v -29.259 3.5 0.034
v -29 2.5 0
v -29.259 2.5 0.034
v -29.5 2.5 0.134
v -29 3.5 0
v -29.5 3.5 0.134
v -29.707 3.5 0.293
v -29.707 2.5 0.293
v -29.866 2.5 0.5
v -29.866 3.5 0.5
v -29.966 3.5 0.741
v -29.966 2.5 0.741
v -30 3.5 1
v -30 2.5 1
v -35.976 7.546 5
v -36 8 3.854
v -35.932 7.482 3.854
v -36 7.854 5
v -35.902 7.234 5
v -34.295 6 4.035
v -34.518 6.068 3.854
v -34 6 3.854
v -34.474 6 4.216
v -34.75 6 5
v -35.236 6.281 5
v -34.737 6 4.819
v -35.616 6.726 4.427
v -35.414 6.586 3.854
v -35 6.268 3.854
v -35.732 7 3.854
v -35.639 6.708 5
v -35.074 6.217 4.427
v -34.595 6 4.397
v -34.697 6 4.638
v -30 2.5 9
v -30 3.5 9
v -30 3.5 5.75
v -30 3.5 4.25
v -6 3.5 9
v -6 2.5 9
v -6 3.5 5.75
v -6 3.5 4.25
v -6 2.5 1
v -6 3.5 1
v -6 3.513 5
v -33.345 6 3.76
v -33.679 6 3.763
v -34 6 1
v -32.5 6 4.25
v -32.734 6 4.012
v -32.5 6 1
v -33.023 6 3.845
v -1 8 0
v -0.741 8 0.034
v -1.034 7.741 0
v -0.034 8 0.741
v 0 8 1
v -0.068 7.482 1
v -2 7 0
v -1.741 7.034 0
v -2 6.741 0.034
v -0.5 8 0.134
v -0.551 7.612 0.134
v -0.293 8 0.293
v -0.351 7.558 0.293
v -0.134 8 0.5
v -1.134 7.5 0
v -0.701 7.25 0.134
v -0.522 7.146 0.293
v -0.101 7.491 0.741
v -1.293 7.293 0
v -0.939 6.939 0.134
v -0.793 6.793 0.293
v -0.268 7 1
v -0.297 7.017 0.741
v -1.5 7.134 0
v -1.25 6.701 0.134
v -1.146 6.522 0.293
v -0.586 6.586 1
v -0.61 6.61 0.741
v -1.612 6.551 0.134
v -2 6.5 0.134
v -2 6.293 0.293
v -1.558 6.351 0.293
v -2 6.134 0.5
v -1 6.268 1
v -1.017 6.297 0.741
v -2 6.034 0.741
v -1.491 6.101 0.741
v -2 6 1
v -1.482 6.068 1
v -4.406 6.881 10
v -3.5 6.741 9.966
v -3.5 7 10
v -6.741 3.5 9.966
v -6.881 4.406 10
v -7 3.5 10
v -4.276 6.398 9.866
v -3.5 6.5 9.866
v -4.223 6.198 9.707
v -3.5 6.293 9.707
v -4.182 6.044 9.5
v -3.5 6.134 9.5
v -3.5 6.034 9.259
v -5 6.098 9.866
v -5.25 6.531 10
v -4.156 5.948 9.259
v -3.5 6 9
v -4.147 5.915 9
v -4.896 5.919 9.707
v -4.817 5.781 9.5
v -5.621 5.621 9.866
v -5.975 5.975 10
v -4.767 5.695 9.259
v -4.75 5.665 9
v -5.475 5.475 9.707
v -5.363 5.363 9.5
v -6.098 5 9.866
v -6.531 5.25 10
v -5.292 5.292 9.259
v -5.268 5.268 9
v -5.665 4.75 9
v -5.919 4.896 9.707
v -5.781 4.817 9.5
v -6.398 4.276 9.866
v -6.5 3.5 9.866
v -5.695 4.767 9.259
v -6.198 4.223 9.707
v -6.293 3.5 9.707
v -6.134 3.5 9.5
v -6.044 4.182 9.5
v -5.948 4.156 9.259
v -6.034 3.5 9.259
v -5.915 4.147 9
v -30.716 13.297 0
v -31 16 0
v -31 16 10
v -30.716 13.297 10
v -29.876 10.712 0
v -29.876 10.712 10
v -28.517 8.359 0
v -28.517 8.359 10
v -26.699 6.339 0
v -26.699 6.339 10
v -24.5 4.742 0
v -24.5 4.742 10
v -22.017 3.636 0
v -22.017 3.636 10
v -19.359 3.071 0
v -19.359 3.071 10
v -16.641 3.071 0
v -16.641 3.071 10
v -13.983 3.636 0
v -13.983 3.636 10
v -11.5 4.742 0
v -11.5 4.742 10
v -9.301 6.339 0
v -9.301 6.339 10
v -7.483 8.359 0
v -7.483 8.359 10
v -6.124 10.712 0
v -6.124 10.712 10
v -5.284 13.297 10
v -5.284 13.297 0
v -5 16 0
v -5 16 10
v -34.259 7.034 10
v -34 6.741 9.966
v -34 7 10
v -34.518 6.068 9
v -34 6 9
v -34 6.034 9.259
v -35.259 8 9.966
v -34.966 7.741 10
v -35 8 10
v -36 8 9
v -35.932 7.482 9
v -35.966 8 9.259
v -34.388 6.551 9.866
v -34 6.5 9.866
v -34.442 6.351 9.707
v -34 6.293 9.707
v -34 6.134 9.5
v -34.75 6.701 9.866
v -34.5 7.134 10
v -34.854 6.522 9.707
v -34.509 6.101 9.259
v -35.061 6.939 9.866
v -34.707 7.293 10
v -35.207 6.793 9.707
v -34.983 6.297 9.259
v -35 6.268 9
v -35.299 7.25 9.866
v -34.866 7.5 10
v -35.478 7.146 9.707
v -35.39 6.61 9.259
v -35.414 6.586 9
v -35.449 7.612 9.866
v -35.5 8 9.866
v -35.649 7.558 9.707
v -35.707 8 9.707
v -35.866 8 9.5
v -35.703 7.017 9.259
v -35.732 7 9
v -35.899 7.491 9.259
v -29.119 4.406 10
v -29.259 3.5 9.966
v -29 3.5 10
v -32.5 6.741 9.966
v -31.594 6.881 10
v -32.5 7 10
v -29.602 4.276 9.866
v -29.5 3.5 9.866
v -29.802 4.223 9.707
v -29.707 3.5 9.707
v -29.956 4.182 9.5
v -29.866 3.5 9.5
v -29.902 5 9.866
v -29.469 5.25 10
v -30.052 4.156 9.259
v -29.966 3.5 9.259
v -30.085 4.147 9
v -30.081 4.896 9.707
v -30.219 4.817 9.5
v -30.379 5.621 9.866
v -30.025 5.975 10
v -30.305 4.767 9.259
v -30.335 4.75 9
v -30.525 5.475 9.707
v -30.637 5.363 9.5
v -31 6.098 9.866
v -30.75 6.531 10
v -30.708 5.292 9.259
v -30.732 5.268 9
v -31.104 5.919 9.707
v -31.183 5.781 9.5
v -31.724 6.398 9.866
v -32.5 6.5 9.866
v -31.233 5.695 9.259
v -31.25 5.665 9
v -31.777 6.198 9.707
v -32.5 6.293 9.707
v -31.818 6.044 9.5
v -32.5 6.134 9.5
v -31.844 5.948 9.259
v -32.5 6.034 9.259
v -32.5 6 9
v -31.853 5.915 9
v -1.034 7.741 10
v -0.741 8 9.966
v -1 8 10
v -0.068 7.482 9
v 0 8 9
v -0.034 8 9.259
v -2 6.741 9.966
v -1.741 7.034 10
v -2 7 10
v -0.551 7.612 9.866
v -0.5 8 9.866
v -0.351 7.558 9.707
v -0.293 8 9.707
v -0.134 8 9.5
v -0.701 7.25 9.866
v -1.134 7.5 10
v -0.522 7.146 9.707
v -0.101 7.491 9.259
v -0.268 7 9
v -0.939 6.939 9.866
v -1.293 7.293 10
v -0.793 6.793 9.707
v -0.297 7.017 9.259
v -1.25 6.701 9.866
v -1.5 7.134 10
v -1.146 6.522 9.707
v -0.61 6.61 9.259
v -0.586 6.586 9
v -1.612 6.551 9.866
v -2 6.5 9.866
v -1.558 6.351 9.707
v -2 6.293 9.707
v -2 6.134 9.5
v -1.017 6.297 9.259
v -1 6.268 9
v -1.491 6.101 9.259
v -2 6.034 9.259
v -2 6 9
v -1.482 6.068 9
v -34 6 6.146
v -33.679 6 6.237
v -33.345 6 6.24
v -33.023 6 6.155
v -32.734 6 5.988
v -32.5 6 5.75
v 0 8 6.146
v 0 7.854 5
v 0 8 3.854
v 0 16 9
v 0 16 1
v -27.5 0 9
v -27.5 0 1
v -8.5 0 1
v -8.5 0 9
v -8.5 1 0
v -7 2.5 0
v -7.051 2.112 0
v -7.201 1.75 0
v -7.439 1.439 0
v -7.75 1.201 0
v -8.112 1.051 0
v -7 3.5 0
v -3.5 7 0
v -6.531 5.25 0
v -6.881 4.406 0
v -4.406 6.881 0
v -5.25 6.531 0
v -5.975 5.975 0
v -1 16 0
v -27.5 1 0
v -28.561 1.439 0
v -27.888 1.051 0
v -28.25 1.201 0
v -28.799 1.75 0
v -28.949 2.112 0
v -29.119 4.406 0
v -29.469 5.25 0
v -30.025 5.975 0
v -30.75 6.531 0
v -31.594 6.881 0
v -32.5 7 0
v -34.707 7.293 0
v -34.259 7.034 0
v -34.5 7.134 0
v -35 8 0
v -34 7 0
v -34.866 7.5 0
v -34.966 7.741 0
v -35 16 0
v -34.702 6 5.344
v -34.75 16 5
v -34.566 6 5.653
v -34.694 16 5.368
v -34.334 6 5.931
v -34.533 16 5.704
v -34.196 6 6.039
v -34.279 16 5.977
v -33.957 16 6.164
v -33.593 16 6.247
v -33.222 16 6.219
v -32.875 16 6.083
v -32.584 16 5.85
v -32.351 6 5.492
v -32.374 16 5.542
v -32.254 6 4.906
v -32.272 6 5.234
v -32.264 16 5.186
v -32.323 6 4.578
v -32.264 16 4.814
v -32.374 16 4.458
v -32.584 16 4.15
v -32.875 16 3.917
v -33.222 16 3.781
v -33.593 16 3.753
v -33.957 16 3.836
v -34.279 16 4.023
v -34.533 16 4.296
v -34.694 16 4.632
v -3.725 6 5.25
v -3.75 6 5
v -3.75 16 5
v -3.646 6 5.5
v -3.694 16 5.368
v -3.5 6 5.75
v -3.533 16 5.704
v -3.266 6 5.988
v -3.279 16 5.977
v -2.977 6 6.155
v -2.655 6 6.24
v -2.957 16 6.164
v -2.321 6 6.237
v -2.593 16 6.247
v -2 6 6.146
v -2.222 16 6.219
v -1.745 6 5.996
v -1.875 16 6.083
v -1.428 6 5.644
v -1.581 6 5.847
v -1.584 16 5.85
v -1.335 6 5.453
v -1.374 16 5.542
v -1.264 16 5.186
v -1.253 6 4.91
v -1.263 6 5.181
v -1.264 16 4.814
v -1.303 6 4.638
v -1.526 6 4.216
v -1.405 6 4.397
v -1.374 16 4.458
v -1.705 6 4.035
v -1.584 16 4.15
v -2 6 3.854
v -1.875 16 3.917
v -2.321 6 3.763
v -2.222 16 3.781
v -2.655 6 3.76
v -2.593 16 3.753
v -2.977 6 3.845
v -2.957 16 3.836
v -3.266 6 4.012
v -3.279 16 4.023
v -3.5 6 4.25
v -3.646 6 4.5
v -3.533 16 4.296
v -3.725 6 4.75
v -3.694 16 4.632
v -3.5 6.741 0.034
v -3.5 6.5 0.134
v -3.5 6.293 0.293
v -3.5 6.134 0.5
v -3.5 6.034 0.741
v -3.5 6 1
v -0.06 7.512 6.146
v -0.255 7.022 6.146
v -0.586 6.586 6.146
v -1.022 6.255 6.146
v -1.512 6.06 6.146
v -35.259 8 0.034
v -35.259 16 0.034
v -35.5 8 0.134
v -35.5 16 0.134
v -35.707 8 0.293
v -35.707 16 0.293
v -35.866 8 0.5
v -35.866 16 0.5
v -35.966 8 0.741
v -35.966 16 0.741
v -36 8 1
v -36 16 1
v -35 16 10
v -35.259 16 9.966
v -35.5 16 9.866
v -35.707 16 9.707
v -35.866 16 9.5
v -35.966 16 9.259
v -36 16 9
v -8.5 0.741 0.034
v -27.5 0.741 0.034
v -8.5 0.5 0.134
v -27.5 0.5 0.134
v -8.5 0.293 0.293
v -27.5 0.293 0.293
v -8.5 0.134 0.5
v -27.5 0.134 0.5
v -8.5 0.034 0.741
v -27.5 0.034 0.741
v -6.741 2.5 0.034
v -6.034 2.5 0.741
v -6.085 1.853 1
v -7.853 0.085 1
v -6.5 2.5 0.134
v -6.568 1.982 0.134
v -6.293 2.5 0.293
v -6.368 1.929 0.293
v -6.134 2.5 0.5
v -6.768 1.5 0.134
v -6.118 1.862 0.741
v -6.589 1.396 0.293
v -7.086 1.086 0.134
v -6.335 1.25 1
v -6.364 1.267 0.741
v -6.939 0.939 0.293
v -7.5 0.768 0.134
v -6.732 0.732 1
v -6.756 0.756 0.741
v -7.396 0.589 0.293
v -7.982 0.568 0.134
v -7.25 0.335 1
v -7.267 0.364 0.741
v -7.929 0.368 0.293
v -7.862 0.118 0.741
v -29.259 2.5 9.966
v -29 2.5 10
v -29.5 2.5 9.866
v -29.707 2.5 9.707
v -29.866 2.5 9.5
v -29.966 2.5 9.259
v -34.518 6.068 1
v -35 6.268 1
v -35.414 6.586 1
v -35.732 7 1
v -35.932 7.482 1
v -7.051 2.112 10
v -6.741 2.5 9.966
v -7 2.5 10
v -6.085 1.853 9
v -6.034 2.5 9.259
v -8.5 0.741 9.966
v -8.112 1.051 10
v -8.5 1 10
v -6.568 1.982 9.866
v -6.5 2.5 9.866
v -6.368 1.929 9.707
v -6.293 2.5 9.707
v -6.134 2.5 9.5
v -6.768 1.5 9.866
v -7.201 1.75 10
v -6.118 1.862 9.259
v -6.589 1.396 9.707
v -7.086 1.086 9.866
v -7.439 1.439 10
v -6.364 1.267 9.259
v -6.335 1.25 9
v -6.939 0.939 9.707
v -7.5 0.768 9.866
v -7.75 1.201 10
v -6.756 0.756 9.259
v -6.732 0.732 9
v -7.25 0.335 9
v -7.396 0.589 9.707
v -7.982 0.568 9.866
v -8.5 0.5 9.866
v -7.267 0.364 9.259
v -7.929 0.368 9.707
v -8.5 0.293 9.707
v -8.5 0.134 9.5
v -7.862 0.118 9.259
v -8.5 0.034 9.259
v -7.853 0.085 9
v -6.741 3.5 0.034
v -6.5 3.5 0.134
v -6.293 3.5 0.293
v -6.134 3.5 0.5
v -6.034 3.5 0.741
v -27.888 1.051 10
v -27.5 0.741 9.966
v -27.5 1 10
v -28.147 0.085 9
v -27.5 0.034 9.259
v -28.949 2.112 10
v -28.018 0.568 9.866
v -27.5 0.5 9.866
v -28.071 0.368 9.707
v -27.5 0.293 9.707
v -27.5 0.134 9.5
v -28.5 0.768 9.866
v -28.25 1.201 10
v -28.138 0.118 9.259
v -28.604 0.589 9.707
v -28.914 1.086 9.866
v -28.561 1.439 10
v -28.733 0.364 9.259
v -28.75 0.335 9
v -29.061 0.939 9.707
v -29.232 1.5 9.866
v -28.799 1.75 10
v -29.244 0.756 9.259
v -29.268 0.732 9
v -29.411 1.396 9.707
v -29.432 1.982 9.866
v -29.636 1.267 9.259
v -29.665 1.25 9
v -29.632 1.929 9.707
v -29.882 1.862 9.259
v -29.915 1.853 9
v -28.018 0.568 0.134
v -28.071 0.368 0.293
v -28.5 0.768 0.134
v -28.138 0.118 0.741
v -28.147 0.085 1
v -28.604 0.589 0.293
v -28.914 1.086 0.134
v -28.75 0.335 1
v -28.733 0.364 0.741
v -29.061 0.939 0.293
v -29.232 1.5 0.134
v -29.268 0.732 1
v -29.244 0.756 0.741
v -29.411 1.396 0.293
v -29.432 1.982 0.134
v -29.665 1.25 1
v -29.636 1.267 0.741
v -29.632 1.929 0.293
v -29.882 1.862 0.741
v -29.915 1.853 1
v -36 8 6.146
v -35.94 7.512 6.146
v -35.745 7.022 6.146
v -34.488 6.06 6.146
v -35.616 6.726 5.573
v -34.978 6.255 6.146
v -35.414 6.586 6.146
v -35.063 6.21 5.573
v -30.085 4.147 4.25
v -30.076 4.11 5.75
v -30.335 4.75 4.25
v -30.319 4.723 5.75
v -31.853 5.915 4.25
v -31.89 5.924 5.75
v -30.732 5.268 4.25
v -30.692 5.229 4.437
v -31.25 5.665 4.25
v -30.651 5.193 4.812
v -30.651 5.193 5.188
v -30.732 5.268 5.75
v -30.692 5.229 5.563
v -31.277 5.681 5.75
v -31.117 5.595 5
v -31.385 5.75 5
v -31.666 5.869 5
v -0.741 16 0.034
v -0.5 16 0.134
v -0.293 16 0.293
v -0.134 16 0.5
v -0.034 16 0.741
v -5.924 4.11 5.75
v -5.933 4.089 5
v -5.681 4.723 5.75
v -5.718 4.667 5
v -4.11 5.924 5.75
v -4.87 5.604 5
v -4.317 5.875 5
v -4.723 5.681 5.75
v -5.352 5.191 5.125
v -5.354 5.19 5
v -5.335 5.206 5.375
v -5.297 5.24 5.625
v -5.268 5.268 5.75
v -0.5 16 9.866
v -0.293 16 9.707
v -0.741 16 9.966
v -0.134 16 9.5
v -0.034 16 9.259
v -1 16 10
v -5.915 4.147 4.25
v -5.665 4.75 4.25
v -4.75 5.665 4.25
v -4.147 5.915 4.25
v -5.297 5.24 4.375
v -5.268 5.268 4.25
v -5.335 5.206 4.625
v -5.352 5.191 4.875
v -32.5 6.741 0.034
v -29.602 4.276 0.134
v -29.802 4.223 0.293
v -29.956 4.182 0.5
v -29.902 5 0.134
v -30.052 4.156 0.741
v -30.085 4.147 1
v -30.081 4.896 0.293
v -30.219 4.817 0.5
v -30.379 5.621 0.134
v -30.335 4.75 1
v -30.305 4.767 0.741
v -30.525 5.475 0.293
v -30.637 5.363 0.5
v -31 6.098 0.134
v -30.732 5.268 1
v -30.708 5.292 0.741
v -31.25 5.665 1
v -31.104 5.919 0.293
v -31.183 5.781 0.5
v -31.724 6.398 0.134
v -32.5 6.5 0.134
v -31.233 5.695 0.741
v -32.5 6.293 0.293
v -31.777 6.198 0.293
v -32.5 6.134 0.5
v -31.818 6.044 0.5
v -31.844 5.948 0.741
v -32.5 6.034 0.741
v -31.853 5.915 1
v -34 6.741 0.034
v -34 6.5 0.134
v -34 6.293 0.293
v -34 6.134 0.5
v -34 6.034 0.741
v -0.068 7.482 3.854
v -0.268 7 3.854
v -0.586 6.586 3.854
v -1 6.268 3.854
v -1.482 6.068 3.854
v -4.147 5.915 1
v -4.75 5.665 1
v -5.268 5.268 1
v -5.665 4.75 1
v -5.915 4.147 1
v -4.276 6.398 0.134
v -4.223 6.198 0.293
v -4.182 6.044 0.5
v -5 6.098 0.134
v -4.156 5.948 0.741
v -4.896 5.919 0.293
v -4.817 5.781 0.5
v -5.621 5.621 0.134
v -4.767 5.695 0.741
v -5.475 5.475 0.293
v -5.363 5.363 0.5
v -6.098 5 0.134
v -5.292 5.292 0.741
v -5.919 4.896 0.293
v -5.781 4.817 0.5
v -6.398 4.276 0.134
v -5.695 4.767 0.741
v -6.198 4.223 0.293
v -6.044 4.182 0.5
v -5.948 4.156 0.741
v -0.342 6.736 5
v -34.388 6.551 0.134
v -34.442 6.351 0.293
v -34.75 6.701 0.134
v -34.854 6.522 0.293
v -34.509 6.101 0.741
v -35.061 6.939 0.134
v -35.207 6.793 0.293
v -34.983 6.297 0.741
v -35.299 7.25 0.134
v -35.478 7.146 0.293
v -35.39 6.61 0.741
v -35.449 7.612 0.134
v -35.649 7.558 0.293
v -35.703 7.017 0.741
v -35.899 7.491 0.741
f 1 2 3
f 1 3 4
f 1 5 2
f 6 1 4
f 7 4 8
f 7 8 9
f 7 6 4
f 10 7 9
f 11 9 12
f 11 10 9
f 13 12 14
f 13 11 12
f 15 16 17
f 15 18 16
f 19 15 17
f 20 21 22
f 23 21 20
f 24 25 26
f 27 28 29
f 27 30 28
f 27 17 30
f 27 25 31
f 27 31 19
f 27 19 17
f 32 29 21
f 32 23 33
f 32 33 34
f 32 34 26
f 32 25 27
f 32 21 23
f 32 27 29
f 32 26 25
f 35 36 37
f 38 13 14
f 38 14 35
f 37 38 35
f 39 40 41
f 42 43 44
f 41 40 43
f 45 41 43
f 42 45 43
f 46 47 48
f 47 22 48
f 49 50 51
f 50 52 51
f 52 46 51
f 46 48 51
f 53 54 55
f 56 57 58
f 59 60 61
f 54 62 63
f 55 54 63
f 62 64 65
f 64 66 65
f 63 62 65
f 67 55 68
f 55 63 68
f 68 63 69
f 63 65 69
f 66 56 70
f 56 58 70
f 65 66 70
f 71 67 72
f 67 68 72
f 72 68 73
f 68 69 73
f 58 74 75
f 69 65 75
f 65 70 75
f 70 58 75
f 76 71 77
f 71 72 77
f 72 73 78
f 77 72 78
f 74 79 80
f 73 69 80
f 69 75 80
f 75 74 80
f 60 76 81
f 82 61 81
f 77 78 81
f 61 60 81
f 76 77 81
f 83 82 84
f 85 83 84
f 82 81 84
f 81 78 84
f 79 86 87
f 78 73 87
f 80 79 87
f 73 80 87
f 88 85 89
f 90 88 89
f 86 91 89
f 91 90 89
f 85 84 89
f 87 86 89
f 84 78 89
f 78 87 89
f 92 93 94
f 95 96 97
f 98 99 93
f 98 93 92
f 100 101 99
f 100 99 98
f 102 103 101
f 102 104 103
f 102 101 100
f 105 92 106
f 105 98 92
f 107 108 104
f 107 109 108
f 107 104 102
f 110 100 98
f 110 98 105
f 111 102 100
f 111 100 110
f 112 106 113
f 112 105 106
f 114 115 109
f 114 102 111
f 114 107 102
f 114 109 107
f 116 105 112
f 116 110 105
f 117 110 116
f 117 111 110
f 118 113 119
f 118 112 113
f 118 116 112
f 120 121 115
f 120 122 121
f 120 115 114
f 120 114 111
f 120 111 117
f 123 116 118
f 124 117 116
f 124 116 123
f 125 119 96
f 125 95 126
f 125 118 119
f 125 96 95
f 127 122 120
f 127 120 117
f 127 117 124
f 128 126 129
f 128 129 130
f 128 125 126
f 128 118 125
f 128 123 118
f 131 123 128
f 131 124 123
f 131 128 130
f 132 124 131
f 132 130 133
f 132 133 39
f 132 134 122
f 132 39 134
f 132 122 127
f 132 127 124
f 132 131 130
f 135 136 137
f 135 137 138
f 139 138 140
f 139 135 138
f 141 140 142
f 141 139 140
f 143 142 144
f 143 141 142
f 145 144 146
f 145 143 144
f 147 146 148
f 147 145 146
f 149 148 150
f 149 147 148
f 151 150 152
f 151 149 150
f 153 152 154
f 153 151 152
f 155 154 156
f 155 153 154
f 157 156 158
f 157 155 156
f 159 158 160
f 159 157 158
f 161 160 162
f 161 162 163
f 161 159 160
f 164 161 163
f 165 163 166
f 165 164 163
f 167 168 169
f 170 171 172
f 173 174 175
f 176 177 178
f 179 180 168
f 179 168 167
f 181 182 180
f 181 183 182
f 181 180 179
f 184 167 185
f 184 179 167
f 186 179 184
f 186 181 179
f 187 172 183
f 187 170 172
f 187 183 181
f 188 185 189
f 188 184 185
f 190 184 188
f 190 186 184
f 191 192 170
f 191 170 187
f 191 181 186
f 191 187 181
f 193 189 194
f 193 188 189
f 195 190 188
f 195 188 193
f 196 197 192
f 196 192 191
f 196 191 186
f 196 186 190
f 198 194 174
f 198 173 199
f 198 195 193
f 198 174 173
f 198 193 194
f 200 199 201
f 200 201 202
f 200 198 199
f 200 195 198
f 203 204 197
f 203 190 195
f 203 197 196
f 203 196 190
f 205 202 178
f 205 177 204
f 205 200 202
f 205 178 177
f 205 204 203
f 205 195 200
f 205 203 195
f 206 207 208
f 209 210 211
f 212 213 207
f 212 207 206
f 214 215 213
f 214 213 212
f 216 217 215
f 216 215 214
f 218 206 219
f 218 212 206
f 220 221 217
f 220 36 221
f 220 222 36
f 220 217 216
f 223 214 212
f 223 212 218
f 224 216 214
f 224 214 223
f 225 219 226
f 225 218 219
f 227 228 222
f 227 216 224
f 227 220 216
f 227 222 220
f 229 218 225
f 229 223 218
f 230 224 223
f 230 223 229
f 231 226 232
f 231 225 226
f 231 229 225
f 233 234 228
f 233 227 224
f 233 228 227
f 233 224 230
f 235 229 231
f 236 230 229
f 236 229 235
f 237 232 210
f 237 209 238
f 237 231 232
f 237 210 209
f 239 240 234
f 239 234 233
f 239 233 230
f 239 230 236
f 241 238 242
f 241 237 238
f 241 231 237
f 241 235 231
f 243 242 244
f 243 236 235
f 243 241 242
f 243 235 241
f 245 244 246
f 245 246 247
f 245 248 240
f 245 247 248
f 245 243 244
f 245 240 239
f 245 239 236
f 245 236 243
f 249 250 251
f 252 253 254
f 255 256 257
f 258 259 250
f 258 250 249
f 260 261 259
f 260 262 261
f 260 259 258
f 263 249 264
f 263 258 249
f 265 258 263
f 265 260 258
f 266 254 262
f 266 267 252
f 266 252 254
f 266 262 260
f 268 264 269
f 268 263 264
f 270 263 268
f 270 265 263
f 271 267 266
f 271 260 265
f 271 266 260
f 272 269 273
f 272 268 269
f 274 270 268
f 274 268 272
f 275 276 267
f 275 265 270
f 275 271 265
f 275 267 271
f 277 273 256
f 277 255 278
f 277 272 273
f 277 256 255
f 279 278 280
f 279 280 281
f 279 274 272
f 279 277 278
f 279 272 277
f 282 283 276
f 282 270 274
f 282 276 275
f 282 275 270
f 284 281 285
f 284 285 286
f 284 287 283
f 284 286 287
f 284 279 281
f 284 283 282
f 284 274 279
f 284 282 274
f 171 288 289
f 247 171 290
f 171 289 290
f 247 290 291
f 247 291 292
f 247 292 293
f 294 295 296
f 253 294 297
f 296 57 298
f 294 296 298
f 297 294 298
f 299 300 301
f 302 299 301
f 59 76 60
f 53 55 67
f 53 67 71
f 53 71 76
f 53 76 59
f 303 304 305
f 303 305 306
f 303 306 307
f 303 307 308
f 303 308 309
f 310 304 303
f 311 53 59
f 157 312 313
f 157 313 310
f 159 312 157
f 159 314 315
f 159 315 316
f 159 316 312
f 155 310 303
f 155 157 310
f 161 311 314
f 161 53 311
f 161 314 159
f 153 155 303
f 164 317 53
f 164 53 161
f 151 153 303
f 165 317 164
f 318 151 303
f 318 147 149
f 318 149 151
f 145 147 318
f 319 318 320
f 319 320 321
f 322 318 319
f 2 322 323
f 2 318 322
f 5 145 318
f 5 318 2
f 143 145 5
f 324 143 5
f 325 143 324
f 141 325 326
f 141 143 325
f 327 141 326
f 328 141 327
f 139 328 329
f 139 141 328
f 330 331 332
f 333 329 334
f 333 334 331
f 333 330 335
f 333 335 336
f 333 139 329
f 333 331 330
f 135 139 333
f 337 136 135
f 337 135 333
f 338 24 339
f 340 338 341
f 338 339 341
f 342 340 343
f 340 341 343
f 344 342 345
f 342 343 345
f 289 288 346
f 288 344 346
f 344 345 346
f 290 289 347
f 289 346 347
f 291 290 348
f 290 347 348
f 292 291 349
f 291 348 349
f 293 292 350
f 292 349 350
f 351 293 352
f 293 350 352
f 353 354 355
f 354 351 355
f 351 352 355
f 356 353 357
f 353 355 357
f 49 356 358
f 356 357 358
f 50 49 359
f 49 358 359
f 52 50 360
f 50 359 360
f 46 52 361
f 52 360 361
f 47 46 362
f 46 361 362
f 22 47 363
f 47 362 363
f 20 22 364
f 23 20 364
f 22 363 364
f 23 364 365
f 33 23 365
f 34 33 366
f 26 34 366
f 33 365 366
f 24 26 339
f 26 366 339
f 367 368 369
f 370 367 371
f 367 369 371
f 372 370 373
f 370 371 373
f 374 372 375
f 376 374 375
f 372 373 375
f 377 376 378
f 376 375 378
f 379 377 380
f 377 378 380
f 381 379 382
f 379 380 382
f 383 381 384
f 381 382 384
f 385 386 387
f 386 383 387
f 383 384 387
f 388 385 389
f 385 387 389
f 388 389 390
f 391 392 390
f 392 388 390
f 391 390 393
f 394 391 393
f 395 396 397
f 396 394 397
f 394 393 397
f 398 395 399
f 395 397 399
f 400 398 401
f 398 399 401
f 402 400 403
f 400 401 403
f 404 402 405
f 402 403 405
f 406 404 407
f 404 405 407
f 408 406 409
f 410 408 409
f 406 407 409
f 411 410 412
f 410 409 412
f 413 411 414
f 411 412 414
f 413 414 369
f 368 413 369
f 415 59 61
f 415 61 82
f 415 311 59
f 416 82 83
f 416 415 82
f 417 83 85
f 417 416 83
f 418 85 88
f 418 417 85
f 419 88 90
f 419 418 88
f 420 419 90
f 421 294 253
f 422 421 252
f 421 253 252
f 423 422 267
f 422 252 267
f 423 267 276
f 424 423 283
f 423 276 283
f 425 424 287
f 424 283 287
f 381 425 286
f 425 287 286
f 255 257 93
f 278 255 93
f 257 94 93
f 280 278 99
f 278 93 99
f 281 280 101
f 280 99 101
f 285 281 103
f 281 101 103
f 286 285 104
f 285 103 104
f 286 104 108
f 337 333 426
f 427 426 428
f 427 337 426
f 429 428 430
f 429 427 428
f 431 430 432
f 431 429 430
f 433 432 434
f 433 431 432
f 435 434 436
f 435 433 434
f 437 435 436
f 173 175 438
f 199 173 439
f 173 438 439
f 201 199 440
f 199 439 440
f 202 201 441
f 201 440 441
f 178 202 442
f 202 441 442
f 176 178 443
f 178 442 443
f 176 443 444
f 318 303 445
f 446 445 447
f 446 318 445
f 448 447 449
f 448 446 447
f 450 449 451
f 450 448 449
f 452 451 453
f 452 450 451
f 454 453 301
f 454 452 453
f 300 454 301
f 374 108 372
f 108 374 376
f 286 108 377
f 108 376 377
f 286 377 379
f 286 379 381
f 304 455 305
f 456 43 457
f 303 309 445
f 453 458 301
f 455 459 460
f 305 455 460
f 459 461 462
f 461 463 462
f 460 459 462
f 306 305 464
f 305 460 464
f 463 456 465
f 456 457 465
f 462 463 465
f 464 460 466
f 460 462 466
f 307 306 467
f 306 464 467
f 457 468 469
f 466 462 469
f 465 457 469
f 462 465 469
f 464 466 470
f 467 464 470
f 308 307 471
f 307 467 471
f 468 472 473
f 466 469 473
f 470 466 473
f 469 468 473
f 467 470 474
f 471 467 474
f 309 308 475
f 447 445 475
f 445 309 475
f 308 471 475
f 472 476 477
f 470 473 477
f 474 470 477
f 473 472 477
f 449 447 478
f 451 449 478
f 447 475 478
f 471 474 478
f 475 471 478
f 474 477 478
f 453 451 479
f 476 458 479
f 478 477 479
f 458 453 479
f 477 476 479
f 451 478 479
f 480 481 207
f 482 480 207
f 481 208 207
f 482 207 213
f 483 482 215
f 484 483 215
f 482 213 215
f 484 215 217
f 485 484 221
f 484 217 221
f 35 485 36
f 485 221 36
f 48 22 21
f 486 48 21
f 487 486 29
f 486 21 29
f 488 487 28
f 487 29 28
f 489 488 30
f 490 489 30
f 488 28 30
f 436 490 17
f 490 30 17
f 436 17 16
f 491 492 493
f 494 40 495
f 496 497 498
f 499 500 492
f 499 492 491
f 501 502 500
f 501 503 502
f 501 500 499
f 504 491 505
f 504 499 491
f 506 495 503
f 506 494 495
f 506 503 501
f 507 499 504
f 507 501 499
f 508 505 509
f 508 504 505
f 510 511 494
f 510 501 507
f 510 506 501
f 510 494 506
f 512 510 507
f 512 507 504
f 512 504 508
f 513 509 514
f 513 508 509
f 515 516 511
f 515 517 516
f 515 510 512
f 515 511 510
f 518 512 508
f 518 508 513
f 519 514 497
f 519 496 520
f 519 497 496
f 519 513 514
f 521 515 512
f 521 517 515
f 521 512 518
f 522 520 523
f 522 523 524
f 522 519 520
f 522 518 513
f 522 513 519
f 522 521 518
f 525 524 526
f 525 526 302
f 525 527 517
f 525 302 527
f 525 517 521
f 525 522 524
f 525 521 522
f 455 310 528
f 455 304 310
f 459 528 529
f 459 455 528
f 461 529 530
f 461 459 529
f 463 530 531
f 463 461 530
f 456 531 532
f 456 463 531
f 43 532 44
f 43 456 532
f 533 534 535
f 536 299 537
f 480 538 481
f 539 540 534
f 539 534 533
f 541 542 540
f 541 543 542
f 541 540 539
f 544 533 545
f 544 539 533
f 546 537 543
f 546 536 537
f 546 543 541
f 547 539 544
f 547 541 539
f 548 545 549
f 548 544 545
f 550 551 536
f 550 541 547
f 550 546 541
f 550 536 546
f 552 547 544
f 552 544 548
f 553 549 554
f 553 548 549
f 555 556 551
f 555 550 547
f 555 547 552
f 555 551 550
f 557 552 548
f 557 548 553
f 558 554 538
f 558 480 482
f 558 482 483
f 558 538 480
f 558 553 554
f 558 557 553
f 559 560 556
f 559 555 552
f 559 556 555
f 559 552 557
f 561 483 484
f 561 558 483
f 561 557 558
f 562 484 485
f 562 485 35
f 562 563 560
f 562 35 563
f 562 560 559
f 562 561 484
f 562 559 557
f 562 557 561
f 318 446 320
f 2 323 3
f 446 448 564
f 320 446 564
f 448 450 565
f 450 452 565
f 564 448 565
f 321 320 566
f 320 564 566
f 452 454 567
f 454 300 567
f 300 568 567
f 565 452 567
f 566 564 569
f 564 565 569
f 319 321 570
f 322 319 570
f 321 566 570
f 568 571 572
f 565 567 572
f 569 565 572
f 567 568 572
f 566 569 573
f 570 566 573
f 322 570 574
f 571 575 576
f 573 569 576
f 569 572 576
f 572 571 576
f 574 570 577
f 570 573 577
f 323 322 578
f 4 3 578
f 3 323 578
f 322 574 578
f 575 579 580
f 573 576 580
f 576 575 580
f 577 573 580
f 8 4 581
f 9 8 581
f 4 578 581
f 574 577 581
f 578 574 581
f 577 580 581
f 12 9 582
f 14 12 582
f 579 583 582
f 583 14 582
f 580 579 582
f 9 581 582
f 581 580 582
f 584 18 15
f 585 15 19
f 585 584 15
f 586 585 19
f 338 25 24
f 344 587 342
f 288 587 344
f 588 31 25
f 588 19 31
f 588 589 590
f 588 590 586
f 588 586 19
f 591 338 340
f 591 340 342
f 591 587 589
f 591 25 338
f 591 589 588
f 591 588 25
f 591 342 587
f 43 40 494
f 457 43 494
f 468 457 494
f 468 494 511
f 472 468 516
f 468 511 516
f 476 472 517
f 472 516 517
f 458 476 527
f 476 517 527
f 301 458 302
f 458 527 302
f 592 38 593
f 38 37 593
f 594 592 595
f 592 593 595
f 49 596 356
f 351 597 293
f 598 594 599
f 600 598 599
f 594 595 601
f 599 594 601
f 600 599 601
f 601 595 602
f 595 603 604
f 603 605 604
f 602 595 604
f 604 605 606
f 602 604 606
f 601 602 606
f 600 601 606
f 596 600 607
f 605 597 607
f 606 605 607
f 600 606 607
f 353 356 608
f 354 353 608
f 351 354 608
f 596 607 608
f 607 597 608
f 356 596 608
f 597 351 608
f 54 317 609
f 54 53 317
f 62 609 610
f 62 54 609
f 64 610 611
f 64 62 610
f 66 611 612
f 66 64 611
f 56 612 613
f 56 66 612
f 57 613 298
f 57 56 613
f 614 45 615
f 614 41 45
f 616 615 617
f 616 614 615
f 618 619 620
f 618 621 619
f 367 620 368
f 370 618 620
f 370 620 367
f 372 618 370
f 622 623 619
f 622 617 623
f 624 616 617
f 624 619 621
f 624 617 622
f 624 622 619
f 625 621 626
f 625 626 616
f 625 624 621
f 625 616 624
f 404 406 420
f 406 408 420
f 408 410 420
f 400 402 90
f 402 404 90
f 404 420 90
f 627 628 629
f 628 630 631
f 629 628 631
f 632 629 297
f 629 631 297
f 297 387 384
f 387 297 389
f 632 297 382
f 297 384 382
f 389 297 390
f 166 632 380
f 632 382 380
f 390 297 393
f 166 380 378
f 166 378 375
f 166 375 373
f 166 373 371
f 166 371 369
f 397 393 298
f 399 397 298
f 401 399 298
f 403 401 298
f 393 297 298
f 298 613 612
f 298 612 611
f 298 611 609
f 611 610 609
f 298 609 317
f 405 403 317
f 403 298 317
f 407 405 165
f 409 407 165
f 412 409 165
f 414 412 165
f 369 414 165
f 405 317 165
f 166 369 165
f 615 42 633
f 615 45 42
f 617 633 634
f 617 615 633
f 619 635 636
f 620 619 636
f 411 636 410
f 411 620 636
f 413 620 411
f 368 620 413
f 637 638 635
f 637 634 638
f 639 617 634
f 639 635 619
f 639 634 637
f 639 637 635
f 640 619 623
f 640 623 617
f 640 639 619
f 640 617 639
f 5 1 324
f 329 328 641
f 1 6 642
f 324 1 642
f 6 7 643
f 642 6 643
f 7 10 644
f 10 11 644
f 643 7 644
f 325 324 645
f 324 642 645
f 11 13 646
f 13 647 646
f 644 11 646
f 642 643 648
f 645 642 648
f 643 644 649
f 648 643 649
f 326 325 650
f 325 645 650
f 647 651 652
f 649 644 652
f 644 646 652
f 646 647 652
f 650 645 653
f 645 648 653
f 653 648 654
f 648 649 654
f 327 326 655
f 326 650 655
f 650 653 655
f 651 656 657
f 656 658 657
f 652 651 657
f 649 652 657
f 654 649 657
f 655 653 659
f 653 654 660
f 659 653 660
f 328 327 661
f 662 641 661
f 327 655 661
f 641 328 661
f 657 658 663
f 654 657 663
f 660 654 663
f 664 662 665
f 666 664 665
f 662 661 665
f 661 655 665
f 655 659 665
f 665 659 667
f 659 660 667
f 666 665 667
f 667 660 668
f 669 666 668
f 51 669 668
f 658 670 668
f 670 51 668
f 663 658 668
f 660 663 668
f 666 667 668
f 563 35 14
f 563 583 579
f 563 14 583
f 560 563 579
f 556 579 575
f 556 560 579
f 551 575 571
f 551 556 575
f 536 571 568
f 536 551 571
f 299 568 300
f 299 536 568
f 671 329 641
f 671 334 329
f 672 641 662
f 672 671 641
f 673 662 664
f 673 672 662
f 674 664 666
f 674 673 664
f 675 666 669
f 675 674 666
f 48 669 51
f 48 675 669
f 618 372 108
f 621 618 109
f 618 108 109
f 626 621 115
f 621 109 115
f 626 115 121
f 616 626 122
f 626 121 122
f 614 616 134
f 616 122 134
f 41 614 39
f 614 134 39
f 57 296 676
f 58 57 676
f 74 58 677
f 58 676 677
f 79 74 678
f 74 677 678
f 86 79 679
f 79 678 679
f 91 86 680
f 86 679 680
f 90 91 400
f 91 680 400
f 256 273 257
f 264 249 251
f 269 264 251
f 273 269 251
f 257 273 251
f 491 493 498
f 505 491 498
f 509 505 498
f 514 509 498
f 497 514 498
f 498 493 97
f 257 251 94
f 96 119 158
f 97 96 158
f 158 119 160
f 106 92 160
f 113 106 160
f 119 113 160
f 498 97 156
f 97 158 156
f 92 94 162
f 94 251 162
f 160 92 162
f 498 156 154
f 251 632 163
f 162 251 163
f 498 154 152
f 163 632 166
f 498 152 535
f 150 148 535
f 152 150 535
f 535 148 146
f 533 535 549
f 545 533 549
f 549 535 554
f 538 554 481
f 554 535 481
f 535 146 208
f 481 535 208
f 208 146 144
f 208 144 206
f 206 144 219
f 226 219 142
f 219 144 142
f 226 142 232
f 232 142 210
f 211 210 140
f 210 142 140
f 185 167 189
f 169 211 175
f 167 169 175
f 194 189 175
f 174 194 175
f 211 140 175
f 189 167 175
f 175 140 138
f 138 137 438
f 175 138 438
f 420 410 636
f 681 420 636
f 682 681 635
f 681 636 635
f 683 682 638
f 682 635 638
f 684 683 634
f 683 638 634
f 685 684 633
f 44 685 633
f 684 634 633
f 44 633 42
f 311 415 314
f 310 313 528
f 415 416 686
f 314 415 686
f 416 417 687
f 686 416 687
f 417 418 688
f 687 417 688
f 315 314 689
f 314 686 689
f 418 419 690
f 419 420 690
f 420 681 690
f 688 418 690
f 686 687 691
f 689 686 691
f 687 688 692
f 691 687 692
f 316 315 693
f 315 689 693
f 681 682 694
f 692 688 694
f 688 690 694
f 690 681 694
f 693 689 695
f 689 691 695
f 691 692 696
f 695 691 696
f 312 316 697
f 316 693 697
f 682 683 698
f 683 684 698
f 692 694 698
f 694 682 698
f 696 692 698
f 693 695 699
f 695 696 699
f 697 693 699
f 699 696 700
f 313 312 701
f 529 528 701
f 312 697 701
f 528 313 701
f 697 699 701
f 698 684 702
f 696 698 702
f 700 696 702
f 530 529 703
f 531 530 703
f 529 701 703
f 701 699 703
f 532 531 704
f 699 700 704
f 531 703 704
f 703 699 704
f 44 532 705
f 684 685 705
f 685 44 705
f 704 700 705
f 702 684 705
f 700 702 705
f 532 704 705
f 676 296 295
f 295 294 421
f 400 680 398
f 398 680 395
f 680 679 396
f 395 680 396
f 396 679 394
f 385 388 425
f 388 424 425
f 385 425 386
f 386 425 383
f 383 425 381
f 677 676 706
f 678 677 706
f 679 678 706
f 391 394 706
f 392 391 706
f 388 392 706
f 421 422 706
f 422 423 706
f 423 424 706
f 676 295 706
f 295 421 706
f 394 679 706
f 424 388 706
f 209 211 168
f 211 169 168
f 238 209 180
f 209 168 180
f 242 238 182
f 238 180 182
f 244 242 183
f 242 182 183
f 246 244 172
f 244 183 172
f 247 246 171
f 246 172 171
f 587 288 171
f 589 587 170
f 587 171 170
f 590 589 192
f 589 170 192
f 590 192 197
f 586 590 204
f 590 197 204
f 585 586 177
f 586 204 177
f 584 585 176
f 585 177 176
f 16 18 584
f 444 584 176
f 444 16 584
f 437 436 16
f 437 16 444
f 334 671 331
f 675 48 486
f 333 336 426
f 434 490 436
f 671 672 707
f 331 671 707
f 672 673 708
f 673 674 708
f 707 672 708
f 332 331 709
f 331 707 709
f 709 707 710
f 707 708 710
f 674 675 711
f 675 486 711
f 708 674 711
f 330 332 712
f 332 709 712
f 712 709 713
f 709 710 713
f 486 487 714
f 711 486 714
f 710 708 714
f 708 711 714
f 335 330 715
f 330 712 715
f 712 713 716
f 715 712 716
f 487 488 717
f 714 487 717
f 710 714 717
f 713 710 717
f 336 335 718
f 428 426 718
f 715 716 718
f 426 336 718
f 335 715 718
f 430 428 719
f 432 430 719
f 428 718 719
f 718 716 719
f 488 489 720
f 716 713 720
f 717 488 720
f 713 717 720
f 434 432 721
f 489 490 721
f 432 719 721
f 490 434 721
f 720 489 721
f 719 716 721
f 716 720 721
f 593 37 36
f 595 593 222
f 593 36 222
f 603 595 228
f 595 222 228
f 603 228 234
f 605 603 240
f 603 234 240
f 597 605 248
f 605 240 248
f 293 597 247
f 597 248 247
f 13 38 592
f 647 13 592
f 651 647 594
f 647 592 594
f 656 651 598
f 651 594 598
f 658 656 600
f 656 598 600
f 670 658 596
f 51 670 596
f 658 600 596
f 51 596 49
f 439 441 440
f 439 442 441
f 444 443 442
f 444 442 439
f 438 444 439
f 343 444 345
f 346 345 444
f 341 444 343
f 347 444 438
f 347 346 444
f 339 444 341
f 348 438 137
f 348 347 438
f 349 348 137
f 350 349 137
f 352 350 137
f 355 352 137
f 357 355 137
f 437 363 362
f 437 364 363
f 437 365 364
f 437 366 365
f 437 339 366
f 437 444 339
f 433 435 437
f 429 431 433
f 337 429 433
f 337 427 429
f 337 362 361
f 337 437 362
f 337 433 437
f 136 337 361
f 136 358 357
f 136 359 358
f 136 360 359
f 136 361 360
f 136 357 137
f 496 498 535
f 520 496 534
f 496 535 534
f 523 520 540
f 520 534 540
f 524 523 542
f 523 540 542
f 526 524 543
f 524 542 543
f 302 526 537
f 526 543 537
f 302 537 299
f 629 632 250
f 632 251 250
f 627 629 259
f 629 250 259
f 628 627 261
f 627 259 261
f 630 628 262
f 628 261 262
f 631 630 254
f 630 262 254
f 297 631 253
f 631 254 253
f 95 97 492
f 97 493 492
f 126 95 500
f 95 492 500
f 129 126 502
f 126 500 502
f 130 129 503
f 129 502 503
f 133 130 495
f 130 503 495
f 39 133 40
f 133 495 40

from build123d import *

# Parameters (mm, degrees)
PAD_DEPTH    = 10
SKETCH_R     = 1.25
POCKET_DEPTH = 16.001
FILLET_R     = 2.5
FILLET001_R  = 2.5
FILLET002_R  = 2.5
FILLET003_R  = 2.5
FILLET004_R  = 2
FILLET005_R  = 2
FILLET006_R  = 1
FILLET007_R  = 1


with BuildPart() as part:
    # Sketch001 → Pad (new body)
    with BuildSketch(Plane.XY):
        with BuildLine():
            Line((-36, 16), (-31, 16))
            ThreePointArc((-31, 16), (-18, 3), (-5, 16))
            Line((0, 16), (-5, 16))
            Line((0, 6), (0, 16))
            Line((-6, 6), (0, 6))
            Line((-6, 0), (-6, 6))
            Line((-30, 0), (-6, 0))
            Line((-30, 6), (-30, 0))
            Line((-36, 6), (-30, 6))
            Line((-36, 6), (-36, 16))
        make_face()
    extrude(amount=PAD_DEPTH)

    # Sketch (on Face4 of Pad) → Pocket (cut, through all)
    with BuildSketch(Plane(origin=(0, 16, 0), x_dir=(-1, 0, 0), z_dir=(0, 1, 0))):
        with Locations((2.5, 5)):
            Circle(SKETCH_R)
        with Locations((33.5, 5)):
            Circle(SKETCH_R)
    extrude(amount=-POCKET_DEPTH, mode=Mode.SUBTRACT)

    # Fillet
    fillet_edges = [part.edges().sort_by_distance(p)[0] for p in [
        (-6, 6, 5),
    ]]
    fillet(fillet_edges, radius=FILLET_R)

    # Fillet001
    fillet001_edges = [part.edges().sort_by_distance(p)[0] for p in [
        (-6, 0, 5),
    ]]
    fillet(fillet001_edges, radius=FILLET001_R)

    # Fillet002
    fillet002_edges = [part.edges().sort_by_distance(p)[0] for p in [
        (-30, 6, 5),
    ]]
    fillet(fillet002_edges, radius=FILLET002_R)

    # Fillet003
    fillet003_edges = [part.edges().sort_by_distance(p)[0] for p in [
        (-30, 0, 5),
    ]]
    fillet(fillet003_edges, radius=FILLET003_R)

    # Fillet004
    fillet004_edges = [part.edges().sort_by_distance(p)[0] for p in [
        (-36, 6, 5),
    ]]
    fillet(fillet004_edges, radius=FILLET004_R)

    # Fillet005
    fillet005_edges = [part.edges().sort_by_distance(p)[0] for p in [
        (0, 6, 5),
    ]]
    fillet(fillet005_edges, radius=FILLET005_R)

    # Fillet006
    fillet006_edges = [part.edges().sort_by_distance(p)[0] for p in [
        (-35.414214, 6.585786, 10),
    ]]
    fillet(fillet006_edges, radius=FILLET006_R)

    # Fillet007
    fillet007_edges = [part.edges().sort_by_distance(p)[0] for p in [
        (-30.732233, 5.267767, 0),
    ]]
    fillet(fillet007_edges, radius=FILLET007_R)


solid = part.part
